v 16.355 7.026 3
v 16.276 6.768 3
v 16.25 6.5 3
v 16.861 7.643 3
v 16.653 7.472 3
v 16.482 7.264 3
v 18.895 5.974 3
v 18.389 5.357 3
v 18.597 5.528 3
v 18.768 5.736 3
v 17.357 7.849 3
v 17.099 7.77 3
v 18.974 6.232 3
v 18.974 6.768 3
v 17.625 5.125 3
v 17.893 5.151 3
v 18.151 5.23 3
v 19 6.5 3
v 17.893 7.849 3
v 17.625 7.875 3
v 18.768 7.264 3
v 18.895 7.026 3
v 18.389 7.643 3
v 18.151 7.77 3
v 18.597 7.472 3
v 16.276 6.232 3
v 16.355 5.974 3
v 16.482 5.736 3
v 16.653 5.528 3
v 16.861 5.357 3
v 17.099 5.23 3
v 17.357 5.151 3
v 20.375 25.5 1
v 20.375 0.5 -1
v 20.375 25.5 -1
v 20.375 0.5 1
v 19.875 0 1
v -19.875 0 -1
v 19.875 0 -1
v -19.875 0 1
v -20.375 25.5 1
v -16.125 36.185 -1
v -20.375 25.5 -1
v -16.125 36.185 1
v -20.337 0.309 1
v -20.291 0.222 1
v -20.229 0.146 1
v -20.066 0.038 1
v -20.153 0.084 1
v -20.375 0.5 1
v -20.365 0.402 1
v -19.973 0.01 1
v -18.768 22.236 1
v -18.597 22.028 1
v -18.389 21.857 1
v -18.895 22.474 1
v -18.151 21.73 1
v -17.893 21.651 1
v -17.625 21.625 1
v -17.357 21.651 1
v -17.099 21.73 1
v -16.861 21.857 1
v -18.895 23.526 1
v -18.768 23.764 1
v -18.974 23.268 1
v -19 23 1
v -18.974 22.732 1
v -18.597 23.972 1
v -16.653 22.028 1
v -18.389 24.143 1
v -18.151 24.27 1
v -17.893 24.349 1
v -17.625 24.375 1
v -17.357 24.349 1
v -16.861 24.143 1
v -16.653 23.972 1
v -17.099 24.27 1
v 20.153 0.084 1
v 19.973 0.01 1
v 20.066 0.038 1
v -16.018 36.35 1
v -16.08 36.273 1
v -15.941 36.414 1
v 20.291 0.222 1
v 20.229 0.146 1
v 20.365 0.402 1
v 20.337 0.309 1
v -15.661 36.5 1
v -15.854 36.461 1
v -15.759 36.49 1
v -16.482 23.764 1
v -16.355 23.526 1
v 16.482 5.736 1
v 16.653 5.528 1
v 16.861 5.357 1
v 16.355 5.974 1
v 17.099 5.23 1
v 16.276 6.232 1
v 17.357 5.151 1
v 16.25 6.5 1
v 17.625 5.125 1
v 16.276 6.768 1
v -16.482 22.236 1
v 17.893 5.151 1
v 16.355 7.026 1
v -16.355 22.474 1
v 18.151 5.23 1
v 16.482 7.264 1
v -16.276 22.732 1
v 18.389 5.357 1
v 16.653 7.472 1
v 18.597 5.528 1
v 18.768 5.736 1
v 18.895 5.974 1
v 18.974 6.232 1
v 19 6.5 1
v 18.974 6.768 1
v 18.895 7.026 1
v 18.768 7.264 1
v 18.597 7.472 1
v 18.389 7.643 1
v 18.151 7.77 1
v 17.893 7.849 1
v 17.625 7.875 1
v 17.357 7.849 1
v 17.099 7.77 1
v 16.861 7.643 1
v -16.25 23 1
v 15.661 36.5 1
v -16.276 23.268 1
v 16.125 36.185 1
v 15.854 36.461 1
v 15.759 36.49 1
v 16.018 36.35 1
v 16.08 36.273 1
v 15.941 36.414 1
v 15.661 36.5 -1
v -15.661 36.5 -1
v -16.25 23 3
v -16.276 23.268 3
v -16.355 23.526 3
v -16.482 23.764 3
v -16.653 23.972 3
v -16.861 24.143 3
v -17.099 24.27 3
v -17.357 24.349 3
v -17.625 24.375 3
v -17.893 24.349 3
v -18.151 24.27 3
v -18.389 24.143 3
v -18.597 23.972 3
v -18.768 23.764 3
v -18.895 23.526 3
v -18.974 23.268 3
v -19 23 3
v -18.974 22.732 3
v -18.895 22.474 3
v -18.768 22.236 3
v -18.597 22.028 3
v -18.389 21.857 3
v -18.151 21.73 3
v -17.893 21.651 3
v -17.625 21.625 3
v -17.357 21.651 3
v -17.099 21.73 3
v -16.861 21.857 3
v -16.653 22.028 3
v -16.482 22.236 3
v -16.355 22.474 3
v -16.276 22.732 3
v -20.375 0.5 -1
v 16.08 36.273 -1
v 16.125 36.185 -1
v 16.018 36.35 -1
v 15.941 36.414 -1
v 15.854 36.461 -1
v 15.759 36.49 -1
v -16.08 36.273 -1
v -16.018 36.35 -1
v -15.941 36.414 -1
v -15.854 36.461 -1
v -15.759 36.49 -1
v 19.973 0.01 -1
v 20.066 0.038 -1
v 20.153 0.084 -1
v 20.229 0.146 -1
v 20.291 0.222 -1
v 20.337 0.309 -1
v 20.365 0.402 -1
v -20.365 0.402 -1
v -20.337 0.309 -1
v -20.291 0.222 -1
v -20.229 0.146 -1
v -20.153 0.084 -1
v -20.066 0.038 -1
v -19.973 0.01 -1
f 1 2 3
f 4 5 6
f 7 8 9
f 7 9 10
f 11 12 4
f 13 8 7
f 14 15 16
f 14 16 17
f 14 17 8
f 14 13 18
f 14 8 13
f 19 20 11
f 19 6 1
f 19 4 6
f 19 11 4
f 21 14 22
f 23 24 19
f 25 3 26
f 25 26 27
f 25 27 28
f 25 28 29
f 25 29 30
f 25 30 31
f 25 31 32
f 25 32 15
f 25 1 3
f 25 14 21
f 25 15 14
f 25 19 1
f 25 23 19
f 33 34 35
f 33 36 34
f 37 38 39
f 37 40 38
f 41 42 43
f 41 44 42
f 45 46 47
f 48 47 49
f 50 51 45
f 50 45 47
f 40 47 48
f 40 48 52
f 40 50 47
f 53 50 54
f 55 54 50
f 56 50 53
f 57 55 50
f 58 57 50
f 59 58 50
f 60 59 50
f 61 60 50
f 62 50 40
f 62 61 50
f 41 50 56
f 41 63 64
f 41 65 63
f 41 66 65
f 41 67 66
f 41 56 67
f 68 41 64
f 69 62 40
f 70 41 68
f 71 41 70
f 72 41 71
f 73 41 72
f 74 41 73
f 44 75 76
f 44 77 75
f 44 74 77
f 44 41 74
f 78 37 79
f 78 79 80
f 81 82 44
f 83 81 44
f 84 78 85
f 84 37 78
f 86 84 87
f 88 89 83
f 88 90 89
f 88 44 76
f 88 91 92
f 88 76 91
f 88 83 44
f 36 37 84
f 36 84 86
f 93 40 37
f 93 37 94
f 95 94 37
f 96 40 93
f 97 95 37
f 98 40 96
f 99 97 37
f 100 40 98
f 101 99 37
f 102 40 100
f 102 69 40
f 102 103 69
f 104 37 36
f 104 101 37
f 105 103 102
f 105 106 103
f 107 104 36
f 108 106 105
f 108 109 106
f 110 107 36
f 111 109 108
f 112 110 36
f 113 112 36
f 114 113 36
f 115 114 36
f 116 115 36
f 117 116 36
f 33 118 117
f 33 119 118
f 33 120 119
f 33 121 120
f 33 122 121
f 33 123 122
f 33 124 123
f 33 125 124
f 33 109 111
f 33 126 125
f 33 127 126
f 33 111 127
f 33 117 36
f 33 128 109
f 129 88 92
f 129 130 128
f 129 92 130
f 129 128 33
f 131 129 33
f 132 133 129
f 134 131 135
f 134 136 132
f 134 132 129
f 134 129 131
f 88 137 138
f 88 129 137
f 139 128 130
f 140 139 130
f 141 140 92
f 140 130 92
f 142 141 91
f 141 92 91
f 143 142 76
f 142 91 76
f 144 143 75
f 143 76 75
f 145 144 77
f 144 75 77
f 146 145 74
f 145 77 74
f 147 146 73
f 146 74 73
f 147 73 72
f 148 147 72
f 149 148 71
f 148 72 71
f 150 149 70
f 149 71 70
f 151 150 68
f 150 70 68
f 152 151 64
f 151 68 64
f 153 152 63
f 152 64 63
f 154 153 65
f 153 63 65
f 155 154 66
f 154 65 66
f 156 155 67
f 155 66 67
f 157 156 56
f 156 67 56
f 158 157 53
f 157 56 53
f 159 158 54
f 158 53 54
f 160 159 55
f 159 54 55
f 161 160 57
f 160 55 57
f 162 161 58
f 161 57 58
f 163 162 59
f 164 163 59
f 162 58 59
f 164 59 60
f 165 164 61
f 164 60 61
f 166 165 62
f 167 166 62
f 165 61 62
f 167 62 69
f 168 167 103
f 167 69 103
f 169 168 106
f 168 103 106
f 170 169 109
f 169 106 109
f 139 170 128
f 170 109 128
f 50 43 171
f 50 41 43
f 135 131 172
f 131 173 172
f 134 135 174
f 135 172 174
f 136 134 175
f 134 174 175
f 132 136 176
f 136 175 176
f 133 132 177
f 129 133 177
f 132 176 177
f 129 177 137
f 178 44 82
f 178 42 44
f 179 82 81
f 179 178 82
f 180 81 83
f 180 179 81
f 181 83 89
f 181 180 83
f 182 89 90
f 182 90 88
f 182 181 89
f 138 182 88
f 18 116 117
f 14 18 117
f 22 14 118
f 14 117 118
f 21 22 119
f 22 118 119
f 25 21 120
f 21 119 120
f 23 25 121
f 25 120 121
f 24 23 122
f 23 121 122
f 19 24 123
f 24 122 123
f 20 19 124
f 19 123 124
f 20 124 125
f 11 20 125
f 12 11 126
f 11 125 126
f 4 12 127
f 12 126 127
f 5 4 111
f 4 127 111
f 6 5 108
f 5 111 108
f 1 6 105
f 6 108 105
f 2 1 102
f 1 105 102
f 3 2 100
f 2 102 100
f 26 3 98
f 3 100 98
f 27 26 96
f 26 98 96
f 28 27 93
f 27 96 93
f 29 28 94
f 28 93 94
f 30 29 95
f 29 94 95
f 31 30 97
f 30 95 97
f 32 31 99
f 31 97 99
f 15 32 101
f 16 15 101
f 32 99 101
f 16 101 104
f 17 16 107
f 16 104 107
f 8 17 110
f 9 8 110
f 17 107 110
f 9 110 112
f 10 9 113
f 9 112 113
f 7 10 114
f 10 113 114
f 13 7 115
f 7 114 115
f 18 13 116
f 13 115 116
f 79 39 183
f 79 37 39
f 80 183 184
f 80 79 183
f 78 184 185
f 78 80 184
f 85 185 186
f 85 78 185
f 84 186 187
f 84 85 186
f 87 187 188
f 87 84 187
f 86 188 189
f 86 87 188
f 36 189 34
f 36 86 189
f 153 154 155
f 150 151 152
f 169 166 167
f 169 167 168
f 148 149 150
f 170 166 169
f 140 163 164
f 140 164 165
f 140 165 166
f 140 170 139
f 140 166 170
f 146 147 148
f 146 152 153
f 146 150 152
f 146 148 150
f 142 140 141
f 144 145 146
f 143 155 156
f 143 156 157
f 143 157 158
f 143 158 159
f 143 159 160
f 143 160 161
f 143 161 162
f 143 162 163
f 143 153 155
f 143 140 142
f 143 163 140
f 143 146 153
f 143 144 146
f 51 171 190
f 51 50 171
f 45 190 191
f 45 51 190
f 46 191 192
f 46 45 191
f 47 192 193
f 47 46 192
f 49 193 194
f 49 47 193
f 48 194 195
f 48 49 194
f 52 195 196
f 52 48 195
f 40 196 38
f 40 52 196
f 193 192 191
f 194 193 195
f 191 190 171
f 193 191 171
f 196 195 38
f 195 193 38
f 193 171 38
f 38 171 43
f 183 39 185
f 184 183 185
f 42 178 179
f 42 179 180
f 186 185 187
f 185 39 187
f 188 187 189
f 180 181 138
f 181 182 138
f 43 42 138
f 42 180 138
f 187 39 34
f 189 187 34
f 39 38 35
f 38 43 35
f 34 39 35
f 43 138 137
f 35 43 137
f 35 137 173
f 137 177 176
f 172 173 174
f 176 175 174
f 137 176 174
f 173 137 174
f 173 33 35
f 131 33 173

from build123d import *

# Parameters (mm, degrees)
F1_DEPTH = 1
F2_R     = 1.375
F3_DEPTH = 2
F4_R     = 0.5


with BuildPart() as f1:
    # F0 (on Top) → F1 (new body, symmetric)
    with BuildSketch(Plane.XY):
        Polygon((-20.375, 25.5), (-20.375, 0), (20.375, 0), (20.375, 25.5), (16, 36.5), (-16, 36.5), align=None)
    extrude(amount=F1_DEPTH, both=True)

    # F2 (on face) → F3 (join)
    with BuildSketch(Plane.XY.offset(1)):
        with Locations((17.625, 6.5)):
            Circle(F2_R)
        with Locations((-17.625, 23)):
            Circle(F2_R)
    extrude(amount=F3_DEPTH)

    # F4
    f4_edges = [f1.edges().sort_by_distance(p)[0] for p in [
        (20.375, 0, 0),
        (-20.375, 0, 0),
        (-16, 36.5, 0),
        (16, 36.5, 0),
    ]]
    fillet(f4_edges, radius=F4_R)


solid = f1.part
